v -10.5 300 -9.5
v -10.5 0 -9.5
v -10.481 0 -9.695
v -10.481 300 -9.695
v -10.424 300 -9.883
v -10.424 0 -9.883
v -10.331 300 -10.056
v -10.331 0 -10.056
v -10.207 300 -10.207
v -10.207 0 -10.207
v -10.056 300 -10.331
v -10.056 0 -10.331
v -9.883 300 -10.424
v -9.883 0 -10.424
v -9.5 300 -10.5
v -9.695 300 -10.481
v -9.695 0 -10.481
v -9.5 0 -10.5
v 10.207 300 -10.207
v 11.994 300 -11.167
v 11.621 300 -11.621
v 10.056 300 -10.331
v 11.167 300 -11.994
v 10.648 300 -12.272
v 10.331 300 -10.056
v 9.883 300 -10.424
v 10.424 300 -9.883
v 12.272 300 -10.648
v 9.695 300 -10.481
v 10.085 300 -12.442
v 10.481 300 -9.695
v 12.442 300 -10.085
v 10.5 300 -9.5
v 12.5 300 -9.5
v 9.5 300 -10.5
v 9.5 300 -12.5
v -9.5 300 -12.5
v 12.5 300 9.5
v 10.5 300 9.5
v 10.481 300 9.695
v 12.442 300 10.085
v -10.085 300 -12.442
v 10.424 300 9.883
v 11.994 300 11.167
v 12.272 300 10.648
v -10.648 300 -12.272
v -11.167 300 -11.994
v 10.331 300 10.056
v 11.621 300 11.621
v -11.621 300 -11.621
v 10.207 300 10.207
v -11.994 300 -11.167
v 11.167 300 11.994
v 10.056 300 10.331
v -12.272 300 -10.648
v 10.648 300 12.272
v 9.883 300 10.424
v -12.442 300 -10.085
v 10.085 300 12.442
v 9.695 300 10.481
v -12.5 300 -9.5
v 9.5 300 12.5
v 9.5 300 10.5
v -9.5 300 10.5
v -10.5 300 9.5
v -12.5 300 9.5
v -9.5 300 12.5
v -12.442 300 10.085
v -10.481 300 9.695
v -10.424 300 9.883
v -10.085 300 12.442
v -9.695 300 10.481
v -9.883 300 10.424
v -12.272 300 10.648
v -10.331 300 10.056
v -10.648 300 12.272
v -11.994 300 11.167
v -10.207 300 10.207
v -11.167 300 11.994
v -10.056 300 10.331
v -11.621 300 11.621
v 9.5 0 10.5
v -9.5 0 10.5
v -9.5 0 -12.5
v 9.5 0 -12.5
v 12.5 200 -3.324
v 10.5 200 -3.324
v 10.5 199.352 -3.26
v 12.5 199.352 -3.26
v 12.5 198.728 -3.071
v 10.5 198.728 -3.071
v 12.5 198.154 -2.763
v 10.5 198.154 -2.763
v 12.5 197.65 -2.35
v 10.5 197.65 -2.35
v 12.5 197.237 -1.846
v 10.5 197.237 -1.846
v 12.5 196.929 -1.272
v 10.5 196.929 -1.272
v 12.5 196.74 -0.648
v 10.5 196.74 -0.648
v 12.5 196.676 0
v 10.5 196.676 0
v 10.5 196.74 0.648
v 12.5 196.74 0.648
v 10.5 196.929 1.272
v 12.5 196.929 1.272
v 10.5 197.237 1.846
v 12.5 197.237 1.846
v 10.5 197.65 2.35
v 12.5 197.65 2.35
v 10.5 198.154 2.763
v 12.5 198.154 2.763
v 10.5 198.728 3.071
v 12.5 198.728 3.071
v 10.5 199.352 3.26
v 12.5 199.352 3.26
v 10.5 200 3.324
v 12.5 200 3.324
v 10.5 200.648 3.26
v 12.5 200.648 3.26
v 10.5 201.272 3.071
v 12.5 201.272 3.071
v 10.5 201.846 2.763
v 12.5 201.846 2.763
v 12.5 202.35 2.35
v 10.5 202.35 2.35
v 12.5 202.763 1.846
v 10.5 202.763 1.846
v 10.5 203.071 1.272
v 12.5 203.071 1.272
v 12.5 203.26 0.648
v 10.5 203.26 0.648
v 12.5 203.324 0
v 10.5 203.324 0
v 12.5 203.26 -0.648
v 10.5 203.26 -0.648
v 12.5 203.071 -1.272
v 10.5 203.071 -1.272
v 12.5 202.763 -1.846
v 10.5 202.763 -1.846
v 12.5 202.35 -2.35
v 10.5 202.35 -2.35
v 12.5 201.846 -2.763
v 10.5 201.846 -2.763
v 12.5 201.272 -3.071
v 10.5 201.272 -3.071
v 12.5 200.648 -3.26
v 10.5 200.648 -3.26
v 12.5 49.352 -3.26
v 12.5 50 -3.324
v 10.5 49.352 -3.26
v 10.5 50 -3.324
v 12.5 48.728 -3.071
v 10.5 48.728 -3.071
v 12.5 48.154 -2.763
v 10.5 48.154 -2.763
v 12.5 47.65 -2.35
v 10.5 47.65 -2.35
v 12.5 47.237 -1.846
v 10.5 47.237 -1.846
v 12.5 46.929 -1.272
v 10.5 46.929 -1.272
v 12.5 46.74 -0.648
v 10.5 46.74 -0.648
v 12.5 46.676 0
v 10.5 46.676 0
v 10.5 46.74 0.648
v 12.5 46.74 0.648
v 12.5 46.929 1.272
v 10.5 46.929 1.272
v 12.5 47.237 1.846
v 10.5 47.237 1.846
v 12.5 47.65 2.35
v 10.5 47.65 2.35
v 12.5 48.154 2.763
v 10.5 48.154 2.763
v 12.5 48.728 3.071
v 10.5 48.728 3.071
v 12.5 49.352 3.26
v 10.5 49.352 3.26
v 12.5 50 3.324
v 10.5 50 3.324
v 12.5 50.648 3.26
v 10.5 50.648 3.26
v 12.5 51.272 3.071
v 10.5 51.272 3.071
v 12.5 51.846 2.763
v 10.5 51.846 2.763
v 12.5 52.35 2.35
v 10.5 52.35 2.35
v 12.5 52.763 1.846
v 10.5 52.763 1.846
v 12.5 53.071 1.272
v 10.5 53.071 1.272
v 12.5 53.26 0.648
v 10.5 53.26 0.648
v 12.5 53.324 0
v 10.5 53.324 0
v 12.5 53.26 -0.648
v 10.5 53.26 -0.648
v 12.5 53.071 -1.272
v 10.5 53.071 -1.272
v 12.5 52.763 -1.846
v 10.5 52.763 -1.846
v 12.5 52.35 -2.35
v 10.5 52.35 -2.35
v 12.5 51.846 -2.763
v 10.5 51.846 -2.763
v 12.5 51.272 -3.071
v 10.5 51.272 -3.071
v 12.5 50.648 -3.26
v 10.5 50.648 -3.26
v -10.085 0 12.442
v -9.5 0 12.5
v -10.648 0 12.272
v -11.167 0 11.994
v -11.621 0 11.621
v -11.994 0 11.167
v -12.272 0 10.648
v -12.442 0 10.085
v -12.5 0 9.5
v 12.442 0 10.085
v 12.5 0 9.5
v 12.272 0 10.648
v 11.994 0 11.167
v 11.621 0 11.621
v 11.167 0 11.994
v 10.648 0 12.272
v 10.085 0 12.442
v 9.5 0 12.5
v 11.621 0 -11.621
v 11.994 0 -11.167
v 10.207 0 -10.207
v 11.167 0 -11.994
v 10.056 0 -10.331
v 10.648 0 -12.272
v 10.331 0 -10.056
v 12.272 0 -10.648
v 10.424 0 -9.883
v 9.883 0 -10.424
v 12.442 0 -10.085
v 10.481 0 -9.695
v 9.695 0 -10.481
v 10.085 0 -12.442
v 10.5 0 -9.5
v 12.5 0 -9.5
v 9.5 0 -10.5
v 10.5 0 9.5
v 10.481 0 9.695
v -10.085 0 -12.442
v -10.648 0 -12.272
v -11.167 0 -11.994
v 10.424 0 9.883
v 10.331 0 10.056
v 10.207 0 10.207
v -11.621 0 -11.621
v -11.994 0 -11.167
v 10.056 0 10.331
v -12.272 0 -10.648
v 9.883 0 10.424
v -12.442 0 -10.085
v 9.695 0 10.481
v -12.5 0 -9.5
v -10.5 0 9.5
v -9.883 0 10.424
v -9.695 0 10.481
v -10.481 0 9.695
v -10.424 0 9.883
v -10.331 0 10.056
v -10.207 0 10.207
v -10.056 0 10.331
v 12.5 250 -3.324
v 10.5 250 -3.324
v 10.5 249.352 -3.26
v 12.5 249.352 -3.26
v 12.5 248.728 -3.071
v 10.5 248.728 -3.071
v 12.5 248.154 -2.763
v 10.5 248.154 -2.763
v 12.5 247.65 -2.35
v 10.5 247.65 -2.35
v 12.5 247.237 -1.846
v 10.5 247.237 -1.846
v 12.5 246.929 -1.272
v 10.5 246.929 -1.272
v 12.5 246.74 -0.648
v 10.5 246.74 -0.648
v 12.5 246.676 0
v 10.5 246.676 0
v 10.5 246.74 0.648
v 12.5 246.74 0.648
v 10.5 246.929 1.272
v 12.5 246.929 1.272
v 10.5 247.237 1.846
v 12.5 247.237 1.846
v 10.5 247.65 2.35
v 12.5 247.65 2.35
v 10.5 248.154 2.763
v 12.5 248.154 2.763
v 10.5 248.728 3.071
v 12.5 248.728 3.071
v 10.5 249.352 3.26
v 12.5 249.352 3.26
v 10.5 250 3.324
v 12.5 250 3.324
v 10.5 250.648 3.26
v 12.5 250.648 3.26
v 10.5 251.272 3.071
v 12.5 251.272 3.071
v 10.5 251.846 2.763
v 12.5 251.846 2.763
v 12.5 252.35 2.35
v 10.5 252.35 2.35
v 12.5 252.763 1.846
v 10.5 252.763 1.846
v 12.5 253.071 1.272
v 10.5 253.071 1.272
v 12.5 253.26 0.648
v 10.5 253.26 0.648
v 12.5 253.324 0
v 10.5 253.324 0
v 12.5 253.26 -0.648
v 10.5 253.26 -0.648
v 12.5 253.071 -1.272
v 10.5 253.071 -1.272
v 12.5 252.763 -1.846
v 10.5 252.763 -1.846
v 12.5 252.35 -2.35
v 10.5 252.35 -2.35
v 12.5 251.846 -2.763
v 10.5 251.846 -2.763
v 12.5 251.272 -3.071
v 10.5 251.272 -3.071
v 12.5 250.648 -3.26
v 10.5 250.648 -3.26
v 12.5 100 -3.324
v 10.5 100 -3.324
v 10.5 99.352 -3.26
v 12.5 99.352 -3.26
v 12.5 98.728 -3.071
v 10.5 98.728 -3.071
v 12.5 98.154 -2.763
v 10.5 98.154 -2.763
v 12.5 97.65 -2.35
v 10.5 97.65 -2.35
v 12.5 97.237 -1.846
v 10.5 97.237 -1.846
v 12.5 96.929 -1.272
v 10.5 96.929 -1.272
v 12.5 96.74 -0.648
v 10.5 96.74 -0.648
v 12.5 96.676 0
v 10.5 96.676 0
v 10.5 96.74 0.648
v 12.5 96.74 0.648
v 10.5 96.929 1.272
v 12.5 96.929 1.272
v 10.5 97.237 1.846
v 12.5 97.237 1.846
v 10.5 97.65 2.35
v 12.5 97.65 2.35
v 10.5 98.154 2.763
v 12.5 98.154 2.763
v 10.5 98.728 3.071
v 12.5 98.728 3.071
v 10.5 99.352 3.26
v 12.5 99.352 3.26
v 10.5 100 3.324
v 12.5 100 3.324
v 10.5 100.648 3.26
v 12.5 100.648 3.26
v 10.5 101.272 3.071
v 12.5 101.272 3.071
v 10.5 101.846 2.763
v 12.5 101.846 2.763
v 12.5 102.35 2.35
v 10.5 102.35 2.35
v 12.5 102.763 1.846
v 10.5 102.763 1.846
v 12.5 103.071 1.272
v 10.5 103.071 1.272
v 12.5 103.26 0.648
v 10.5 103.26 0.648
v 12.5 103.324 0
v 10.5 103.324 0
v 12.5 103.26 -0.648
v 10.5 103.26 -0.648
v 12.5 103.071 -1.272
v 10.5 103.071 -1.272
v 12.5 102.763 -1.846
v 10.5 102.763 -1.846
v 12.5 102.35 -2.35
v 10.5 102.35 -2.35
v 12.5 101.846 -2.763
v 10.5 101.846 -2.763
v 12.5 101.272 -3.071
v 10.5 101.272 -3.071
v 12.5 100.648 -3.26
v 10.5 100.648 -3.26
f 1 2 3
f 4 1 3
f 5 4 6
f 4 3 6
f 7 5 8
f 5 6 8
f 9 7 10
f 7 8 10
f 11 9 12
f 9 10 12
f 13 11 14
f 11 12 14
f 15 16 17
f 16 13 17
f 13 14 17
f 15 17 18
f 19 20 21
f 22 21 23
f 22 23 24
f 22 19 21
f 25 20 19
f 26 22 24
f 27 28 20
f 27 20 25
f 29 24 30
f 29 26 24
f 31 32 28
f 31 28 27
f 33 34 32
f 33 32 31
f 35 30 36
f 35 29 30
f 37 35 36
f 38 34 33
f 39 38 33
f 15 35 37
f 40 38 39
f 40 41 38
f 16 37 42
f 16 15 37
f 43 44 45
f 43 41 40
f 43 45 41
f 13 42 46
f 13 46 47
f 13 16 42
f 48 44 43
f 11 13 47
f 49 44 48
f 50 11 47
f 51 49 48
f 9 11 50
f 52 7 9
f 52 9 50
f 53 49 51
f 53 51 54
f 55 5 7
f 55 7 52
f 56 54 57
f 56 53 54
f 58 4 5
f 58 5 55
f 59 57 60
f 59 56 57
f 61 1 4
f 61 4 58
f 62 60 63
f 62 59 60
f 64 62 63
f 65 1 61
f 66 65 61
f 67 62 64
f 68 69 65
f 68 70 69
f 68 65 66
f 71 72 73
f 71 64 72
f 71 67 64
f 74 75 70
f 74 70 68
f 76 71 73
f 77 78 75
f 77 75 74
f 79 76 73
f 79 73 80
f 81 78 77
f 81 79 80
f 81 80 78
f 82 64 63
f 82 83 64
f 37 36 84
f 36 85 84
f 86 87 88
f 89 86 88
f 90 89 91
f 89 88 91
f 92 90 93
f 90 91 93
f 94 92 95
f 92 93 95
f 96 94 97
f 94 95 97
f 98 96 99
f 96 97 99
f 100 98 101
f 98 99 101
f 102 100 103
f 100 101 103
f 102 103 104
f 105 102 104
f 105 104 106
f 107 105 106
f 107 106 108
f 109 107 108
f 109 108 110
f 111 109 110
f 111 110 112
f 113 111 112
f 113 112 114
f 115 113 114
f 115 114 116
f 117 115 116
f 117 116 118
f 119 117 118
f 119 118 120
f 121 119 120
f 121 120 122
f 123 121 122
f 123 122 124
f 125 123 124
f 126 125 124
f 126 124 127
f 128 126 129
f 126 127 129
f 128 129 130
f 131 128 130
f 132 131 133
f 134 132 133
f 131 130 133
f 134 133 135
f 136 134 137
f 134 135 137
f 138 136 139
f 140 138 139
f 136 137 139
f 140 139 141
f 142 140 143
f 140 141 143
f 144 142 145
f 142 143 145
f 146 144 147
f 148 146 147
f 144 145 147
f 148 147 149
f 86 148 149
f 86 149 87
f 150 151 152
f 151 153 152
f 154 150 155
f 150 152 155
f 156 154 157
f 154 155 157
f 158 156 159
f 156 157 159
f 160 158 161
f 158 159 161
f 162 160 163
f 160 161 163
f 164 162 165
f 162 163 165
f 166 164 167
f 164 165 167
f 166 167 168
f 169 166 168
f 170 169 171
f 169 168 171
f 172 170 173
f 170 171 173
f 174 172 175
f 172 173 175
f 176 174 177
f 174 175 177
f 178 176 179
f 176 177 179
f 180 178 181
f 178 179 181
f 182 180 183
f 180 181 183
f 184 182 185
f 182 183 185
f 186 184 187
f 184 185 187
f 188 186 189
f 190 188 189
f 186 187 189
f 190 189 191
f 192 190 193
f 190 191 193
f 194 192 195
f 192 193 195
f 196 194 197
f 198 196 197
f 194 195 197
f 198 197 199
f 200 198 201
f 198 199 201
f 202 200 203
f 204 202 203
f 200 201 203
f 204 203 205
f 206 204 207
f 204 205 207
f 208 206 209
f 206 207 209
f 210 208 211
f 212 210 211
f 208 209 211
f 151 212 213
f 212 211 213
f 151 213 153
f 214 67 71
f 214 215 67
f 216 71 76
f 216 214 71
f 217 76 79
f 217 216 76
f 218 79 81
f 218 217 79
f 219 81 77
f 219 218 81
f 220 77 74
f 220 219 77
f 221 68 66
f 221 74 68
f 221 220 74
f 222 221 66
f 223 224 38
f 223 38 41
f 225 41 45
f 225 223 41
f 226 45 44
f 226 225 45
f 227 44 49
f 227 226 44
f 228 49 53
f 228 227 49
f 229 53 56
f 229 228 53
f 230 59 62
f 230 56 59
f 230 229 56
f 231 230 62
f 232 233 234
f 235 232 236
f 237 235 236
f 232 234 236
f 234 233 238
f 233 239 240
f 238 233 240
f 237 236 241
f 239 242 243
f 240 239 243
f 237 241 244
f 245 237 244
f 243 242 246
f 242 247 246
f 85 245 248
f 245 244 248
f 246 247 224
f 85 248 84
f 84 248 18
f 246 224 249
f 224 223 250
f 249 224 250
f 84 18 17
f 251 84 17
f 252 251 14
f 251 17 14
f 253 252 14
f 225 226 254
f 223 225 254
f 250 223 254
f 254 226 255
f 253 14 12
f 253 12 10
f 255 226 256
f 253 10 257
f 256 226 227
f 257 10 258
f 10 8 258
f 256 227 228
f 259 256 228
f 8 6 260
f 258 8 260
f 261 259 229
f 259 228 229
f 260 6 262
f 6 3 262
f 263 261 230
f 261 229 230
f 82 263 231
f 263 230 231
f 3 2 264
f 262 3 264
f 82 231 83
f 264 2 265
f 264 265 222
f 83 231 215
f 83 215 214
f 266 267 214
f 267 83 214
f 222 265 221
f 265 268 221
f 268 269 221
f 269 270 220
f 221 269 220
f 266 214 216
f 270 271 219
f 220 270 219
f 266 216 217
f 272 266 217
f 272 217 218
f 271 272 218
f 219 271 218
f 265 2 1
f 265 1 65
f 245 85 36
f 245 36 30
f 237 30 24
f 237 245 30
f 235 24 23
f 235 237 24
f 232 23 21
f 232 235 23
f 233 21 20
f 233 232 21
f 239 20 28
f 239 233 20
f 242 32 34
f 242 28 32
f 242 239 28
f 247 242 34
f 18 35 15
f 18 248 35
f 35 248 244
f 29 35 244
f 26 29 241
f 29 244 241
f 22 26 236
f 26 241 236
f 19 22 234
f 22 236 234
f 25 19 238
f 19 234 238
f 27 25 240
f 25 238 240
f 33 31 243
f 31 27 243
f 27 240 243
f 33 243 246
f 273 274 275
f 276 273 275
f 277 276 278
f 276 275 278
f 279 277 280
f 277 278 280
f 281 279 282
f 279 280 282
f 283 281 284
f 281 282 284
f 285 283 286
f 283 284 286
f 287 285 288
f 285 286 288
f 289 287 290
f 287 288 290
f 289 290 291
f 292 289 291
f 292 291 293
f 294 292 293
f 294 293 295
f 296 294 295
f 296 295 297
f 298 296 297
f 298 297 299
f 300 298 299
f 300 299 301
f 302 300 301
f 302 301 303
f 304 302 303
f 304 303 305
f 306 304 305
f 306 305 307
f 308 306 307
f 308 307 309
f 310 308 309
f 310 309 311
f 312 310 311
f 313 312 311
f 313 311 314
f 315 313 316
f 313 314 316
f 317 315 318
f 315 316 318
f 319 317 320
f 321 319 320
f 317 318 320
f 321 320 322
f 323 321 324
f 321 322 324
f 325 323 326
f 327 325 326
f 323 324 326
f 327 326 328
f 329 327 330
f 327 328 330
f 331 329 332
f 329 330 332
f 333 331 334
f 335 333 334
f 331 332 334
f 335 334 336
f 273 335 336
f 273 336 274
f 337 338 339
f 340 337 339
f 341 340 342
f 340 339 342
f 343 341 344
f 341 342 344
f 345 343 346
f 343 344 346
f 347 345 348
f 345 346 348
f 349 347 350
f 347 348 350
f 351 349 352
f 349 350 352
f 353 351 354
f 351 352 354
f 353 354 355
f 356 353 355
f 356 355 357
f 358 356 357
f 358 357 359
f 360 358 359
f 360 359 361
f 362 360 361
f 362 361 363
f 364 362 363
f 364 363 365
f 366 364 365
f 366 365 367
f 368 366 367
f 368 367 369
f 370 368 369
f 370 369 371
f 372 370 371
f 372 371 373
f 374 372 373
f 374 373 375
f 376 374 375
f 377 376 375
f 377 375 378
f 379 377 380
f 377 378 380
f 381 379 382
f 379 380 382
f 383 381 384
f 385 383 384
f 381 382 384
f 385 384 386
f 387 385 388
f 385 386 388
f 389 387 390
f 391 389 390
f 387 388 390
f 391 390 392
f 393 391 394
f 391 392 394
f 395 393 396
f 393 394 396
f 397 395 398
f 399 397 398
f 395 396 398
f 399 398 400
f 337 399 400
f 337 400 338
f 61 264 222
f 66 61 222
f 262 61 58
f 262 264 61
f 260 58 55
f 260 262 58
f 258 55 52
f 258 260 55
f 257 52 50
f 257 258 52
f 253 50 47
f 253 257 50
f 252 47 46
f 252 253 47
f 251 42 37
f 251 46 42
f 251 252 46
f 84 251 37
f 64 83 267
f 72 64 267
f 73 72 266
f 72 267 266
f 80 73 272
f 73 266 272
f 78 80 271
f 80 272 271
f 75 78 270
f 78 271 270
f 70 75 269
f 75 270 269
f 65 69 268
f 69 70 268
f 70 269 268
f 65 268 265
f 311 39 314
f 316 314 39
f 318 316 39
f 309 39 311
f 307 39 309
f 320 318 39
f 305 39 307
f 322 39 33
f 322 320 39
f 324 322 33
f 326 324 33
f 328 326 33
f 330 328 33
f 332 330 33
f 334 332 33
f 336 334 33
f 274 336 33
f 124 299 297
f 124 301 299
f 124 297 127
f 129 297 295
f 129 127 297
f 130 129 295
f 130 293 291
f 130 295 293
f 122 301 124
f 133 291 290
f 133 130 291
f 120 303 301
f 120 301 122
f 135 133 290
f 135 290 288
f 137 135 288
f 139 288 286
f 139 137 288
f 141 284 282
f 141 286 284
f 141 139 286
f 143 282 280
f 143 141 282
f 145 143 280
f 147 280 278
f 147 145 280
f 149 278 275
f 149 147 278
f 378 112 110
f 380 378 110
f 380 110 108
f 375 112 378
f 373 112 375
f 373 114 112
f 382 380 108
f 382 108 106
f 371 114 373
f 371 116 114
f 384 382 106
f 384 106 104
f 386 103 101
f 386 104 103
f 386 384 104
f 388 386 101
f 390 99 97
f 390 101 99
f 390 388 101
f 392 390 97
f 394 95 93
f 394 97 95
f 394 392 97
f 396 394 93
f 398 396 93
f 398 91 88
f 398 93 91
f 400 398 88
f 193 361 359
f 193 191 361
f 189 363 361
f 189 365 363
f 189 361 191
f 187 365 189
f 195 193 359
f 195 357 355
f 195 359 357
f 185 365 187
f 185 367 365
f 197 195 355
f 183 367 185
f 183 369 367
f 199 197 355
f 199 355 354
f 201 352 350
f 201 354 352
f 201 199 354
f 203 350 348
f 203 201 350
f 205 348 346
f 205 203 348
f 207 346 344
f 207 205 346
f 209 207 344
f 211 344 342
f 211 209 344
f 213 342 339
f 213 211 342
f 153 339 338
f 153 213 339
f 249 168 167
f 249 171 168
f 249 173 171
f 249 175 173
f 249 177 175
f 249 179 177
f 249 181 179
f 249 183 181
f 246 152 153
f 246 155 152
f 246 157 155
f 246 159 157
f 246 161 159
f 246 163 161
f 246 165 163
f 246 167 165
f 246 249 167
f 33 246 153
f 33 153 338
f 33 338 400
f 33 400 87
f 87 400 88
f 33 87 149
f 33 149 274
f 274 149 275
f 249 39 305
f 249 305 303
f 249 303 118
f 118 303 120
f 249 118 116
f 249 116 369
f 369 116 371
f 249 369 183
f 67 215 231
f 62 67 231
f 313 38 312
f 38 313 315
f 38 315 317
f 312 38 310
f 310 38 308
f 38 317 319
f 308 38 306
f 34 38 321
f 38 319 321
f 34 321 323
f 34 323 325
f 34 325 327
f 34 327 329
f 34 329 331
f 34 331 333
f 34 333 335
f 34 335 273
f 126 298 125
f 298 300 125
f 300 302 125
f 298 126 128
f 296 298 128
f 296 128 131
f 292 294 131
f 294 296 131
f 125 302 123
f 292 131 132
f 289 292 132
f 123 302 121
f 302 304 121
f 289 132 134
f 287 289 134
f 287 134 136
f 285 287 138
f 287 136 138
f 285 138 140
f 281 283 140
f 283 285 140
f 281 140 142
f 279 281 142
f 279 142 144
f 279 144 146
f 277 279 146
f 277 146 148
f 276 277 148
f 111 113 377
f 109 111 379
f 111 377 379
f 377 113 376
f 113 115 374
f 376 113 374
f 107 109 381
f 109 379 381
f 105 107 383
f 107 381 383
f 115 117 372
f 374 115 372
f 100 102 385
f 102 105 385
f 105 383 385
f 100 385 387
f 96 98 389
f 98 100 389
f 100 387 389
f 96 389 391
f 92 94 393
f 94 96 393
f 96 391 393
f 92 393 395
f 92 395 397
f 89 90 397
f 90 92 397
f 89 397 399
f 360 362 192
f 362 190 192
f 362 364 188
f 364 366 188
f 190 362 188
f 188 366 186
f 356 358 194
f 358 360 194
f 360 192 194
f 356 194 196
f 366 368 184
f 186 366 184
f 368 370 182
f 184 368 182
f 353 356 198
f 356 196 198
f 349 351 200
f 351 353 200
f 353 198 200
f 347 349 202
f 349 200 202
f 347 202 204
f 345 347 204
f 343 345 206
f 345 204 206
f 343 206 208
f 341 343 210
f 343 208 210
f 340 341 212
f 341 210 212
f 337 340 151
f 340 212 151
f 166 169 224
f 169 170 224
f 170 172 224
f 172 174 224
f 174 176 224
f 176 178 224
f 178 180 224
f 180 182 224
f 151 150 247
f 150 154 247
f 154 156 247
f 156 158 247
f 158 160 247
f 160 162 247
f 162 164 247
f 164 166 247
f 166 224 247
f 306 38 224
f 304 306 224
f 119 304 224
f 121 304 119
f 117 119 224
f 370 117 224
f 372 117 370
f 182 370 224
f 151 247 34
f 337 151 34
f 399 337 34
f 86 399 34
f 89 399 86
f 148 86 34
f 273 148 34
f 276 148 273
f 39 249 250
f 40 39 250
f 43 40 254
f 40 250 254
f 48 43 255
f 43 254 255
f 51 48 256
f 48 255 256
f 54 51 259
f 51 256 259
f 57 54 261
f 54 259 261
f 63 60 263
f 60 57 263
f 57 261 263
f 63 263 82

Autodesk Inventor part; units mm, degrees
ref_plane "YZ Plane" through (0, 0, 0) normal (1, 0, 0) x (0, 1, 0)
ref_plane "XZ Plane" through (0, 0, 0) normal (0, 1, 0) x (-1, 0, 0)
ref_plane "XY Plane" through (0, 0, 0) normal (0, 0, 1) x (1, 0, 0)
sketch "Sketch1" plane through (0, 0, 0) normal (0, 1, 0) x (-1, 0, 0)
  line L0 (-9.5, 11.5) -> (9.5, 11.5) construction
  line L1 (11.5, 9.5) -> (11.5, -9.5) construction
  line L2 (9.5, -11.5) -> (-9.5, -11.5) construction
  line L3 (-11.5, -9.5) -> (-11.5, 9.5) construction
  line L4 (-11.5, 11.5) -> (11.5, -11.5) construction
  line L5 (11.5, 11.5) -> (-11.5, -11.5) construction
  arc A0 (11.5, 9.5) -> (9.5, 11.5) centre (9.5, 9.5) ccw construction
  arc A1 (9.5, -11.5) -> (11.5, -9.5) centre (9.5, -9.5) ccw construction
  arc A2 (-11.5, -9.5) -> (-9.5, -11.5) centre (-9.5, -9.5) ccw construction
  arc A3 (-9.5, 11.5) -> (-11.5, 9.5) centre (-9.5, 9.5) ccw construction
  line L6 (-9.5, -12.5) -> (9.5, -12.5)
  arc A4 (9.5, -12.5) -> (12.5, -9.5) centre (9.5, -9.5) ccw
  line L7 (12.5, -9.5) -> (12.5, 9.5)
  arc A5 (12.5, 9.5) -> (9.5, 12.5) centre (9.5, 9.5) ccw
  line L8 (9.5, 12.5) -> (-9.5, 12.5)
  arc A6 (-9.5, 12.5) -> (-12.5, 9.5) centre (-9.5, 9.5) ccw
  line L9 (-12.5, 9.5) -> (-12.5, -9.5)
  arc A7 (-12.5, -9.5) -> (-9.5, -12.5) centre (-9.5, -9.5) ccw
  line L10 (10.5, -9.5) -> (10.5, 9.5)
  arc A8 (10.5, 9.5) -> (9.5, 10.5) centre (9.5, 9.5) ccw
  line L11 (9.5, 10.5) -> (-9.5, 10.5)
  arc A9 (-9.5, 10.5) -> (-10.5, 9.5) centre (-9.5, 9.5) ccw
  line L12 (-10.5, 9.5) -> (-10.5, -9.5)
  arc A10 (-10.5, -9.5) -> (-9.5, -10.5) centre (-9.5, -9.5) ccw
  line L13 (-9.5, -10.5) -> (9.5, -10.5)
  arc A11 (9.5, -10.5) -> (10.5, -9.5) centre (9.5, -9.5) ccw
  point P0 (0, 0)
  point P1 (0, 0)
  point P2 (0, 0)
  dimension "d10" = 2
  dimension "depth" = 25
  dimension "width" = 25
  dimension "thickness" = 2
extrude "Extrusion1" add sketch "Sketch1" along normal blind 300
sketch "Sketch2" plane through (12.5, 0, 9.5) normal (1, 0, 0) x (0, 0, -1)
  line L0 (9.5, -60) -> (9.5, 360) construction
  line L1 (0, 300) -> (19, 300) projected
  line L2 (0, 0) -> (19, 0) projected
  line L3 (-3, 0) -> (-3, 300) projected
  line L4 (-3, 150) -> (-40.443, 150) construction
  point P0 (9.5, 0)
  point P1 (9.5, 250)
  point P2 (9.5, 200)
  point P3 (9.5, 50)
  point P4 (9.5, 100)
  dimension "d17" = 50
  dimension "d28" = 50
  dimension "d29" = 100
hole "Hole1" at (12.5, 250, 0) at (12.5, 200, 0) at (12.5, 100, 0) at (12.5, 50, 0) direction (-1, 0, 0) diameter 6.647 depth 20.2 tip angle 118 thread size "M8x1.25" class "6H" standard "ANSI Metric M Profile"
equation "\"d10\" = thickness"
properties part number "Lacznik prosty" material "Steel"
